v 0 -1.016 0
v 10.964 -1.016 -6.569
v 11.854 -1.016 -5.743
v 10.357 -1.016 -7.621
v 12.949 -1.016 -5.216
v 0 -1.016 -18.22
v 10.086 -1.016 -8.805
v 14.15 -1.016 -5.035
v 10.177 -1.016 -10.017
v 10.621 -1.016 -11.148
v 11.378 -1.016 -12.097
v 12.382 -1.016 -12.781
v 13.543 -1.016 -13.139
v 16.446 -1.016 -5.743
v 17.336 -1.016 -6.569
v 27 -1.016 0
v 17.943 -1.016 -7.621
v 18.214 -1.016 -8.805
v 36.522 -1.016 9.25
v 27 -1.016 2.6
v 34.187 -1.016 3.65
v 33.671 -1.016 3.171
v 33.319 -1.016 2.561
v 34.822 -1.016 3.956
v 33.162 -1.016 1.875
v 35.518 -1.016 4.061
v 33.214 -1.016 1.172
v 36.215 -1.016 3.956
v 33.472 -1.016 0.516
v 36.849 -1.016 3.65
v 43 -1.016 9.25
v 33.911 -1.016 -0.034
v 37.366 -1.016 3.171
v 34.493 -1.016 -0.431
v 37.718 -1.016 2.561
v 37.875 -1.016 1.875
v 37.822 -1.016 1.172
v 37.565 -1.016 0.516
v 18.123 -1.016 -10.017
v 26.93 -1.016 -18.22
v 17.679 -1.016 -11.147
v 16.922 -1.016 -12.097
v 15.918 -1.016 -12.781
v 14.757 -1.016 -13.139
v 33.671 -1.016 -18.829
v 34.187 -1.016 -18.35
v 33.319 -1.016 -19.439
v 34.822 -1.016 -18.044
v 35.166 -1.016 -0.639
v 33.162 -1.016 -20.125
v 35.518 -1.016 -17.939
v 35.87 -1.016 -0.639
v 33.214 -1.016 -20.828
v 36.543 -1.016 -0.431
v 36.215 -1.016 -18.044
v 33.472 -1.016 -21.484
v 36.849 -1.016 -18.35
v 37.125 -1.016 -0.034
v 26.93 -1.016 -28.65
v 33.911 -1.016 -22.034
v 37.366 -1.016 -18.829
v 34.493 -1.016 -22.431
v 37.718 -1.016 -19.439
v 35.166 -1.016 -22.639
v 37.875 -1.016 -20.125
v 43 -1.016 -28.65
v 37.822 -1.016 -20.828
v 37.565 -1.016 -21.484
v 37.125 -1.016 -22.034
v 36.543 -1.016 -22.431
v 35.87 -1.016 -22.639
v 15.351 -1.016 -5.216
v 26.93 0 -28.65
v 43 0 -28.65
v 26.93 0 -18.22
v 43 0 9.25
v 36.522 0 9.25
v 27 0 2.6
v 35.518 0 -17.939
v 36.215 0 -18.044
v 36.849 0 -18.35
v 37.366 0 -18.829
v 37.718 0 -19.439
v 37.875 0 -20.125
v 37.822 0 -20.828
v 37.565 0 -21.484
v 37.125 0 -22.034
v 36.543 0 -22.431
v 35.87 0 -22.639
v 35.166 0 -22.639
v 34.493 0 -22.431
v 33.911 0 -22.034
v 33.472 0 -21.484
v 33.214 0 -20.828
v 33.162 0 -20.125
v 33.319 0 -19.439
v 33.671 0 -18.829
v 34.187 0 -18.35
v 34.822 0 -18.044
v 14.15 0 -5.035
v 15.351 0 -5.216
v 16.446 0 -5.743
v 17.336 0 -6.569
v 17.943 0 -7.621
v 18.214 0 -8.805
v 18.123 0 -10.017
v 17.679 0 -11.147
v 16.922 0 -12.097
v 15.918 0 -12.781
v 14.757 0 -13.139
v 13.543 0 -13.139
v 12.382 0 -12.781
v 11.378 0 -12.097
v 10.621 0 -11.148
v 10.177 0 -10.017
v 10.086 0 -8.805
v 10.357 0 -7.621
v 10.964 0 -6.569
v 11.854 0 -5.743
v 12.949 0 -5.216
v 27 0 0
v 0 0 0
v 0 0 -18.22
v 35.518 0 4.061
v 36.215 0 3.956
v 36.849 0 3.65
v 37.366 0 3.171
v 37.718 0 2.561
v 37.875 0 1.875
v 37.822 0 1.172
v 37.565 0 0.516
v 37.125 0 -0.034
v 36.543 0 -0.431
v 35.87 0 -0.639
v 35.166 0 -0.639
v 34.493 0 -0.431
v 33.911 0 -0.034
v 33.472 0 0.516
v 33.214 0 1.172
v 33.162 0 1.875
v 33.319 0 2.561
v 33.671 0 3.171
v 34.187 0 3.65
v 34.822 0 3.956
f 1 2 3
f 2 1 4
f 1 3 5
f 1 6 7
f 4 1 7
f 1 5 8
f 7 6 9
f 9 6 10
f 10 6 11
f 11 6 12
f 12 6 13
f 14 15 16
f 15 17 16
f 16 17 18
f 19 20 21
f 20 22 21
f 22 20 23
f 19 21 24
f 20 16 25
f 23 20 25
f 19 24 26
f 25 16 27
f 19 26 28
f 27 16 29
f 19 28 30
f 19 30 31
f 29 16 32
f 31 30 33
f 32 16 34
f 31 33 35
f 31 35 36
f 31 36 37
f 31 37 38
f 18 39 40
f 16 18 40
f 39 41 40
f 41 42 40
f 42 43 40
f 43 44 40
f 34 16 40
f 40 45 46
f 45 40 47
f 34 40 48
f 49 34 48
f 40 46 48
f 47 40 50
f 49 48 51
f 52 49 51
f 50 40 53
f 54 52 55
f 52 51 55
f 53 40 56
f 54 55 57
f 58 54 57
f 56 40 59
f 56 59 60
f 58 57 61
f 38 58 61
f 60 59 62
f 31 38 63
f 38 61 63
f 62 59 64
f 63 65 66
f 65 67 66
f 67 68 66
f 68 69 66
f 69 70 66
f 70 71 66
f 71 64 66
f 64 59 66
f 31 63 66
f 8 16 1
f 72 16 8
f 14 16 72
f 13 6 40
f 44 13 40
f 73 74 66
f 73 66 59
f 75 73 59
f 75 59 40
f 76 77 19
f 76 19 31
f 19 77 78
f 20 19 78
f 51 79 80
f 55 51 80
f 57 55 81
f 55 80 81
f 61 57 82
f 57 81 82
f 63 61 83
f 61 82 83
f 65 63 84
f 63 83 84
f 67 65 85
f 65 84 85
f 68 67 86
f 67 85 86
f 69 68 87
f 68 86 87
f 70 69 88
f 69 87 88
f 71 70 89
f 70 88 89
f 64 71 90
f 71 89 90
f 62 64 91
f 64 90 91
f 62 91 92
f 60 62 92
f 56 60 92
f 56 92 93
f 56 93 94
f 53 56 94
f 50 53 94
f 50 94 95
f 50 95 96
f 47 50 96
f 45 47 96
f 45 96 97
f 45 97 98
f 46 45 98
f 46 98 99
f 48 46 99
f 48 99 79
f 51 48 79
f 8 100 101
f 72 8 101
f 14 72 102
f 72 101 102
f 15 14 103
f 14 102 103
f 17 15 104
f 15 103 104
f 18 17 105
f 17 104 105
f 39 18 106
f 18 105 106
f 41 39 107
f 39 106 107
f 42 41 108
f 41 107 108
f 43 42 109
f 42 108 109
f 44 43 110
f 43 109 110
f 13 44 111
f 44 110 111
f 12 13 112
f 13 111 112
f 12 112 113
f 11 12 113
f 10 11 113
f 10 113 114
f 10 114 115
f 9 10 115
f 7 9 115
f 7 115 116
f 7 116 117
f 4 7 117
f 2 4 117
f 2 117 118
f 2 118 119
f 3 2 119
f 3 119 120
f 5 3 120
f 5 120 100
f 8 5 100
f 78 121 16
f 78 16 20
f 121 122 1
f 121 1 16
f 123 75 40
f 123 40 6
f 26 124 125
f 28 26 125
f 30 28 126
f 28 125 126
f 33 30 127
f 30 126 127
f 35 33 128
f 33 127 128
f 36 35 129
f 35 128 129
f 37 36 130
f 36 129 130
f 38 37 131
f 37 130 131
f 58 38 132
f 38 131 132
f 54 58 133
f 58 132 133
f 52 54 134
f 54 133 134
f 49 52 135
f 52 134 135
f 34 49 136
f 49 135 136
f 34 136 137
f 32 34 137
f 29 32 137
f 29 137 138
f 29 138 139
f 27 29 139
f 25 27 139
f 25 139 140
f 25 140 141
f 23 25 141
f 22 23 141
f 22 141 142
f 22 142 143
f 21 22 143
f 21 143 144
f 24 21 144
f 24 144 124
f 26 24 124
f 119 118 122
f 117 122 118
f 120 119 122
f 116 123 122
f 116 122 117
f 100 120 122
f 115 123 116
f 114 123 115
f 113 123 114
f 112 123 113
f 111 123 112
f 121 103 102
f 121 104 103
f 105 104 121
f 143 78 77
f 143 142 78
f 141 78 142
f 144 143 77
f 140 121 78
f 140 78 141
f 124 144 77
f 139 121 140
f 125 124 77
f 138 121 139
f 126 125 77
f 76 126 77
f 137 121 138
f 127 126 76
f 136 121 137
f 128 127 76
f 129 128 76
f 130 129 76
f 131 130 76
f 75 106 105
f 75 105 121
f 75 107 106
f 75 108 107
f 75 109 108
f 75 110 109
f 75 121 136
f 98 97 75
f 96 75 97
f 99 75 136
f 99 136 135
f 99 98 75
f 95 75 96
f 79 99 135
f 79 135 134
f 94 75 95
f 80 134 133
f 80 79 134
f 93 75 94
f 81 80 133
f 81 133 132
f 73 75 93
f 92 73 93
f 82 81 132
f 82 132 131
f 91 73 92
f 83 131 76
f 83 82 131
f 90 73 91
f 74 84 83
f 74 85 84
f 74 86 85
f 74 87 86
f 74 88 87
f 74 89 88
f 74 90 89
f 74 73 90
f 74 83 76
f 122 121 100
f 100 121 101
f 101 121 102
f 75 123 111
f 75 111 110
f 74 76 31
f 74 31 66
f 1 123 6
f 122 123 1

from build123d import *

# Parameters (mm, degrees)
BASE_FLANGE1_DEPTH = 1.016
SKETCH6_R          = 4.075
CUT_EXTRUDE1_DEPTH = 52.680313041
CUT_EXTRUDE2_REACH = 53.68
CUT_EXTRUDE3_REACH = 53.68
SKETCH8_R          = 2.36295848


# Sheet-metal steps are written as plain solids
with BuildPart() as part:
    # Sketch1 → Base-Flange1 (new body)
    with BuildSketch(Plane(origin=(0, 0, 0), x_dir=(1, 0, 0), z_dir=(0, 1, 0))):
        Polygon((27, 0), (27, -9.25), (43, -9.25), (43, -1.78), (43, 18.22), (43, 28.65), (26.93, 28.65), (26.93, 18.22), (0, 18.22), (0, 0), align=None)
    extrude(amount=-BASE_FLANGE1_DEPTH)

    # Sketch6 → Cut-Extrude1 (cut, through all)
    with BuildSketch(Plane(origin=(0, 0, 0), x_dir=(1, 0, 0), z_dir=(0, 1, 0))):
        with Locations(Location((14.15, 9.11, 0), (0, 0, 270))):
            Circle(SKETCH6_R)
    extrude(amount=-CUT_EXTRUDE1_DEPTH, mode=Mode.SUBTRACT)

    # Sketch7 → Cut-Extrude2 (cut, up to next)
    with BuildSketch(Plane(origin=(0, 0, 0), x_dir=(1, 0, 0), z_dir=(0, 1, 0)), mode=Mode.PRIVATE) as cut_extrude2_sk1:
        Polygon((36.522343865, -9.25), (27, -2.599722771), (27, -9.25), align=None)
    cut_extrude2_tool1 = extrude(cut_extrude2_sk1.sketch, amount=-CUT_EXTRUDE2_REACH, mode=Mode.PRIVATE) & part.part
    add(cut_extrude2_tool1.solids().sort_by_distance((30.174115, 0, 7.033241))[0], mode=Mode.SUBTRACT)

    # Sketch8 → Cut-Extrude3 (cut, up to next)
    with BuildSketch(Plane(origin=(0, 0, 0), x_dir=(1, 0, 0), z_dir=(0, 1, 0)), mode=Mode.PRIVATE) as cut_extrude3_sk1:
        with Locations(Location((35.518210435, -1.697952117, 0), (0, 0, 270))):
            Circle(SKETCH8_R)
    cut_extrude3_tool1 = extrude(cut_extrude3_sk1.sketch, amount=-CUT_EXTRUDE3_REACH, mode=Mode.PRIVATE) & part.part
    # Sketch8 → Cut-Extrude3 (cut, up to next)
    with BuildSketch(Plane(origin=(0, 0, 0), x_dir=(1, 0, 0), z_dir=(0, 1, 0)), mode=Mode.PRIVATE) as cut_extrude3_sk2:
        with Locations(Location((35.518210435, 20.302047883, 0), (0, 0, 270))):
            Circle(SKETCH8_R)
    cut_extrude3_tool2 = extrude(cut_extrude3_sk2.sketch, amount=-CUT_EXTRUDE3_REACH, mode=Mode.PRIVATE) & part.part
    add(cut_extrude3_tool1.solids().sort_by_distance((35.51821, 0, 1.697952))[0], mode=Mode.SUBTRACT)
    add(cut_extrude3_tool2.solids().sort_by_distance((35.51821, 0, -20.302048))[0], mode=Mode.SUBTRACT)


solid = part.part
